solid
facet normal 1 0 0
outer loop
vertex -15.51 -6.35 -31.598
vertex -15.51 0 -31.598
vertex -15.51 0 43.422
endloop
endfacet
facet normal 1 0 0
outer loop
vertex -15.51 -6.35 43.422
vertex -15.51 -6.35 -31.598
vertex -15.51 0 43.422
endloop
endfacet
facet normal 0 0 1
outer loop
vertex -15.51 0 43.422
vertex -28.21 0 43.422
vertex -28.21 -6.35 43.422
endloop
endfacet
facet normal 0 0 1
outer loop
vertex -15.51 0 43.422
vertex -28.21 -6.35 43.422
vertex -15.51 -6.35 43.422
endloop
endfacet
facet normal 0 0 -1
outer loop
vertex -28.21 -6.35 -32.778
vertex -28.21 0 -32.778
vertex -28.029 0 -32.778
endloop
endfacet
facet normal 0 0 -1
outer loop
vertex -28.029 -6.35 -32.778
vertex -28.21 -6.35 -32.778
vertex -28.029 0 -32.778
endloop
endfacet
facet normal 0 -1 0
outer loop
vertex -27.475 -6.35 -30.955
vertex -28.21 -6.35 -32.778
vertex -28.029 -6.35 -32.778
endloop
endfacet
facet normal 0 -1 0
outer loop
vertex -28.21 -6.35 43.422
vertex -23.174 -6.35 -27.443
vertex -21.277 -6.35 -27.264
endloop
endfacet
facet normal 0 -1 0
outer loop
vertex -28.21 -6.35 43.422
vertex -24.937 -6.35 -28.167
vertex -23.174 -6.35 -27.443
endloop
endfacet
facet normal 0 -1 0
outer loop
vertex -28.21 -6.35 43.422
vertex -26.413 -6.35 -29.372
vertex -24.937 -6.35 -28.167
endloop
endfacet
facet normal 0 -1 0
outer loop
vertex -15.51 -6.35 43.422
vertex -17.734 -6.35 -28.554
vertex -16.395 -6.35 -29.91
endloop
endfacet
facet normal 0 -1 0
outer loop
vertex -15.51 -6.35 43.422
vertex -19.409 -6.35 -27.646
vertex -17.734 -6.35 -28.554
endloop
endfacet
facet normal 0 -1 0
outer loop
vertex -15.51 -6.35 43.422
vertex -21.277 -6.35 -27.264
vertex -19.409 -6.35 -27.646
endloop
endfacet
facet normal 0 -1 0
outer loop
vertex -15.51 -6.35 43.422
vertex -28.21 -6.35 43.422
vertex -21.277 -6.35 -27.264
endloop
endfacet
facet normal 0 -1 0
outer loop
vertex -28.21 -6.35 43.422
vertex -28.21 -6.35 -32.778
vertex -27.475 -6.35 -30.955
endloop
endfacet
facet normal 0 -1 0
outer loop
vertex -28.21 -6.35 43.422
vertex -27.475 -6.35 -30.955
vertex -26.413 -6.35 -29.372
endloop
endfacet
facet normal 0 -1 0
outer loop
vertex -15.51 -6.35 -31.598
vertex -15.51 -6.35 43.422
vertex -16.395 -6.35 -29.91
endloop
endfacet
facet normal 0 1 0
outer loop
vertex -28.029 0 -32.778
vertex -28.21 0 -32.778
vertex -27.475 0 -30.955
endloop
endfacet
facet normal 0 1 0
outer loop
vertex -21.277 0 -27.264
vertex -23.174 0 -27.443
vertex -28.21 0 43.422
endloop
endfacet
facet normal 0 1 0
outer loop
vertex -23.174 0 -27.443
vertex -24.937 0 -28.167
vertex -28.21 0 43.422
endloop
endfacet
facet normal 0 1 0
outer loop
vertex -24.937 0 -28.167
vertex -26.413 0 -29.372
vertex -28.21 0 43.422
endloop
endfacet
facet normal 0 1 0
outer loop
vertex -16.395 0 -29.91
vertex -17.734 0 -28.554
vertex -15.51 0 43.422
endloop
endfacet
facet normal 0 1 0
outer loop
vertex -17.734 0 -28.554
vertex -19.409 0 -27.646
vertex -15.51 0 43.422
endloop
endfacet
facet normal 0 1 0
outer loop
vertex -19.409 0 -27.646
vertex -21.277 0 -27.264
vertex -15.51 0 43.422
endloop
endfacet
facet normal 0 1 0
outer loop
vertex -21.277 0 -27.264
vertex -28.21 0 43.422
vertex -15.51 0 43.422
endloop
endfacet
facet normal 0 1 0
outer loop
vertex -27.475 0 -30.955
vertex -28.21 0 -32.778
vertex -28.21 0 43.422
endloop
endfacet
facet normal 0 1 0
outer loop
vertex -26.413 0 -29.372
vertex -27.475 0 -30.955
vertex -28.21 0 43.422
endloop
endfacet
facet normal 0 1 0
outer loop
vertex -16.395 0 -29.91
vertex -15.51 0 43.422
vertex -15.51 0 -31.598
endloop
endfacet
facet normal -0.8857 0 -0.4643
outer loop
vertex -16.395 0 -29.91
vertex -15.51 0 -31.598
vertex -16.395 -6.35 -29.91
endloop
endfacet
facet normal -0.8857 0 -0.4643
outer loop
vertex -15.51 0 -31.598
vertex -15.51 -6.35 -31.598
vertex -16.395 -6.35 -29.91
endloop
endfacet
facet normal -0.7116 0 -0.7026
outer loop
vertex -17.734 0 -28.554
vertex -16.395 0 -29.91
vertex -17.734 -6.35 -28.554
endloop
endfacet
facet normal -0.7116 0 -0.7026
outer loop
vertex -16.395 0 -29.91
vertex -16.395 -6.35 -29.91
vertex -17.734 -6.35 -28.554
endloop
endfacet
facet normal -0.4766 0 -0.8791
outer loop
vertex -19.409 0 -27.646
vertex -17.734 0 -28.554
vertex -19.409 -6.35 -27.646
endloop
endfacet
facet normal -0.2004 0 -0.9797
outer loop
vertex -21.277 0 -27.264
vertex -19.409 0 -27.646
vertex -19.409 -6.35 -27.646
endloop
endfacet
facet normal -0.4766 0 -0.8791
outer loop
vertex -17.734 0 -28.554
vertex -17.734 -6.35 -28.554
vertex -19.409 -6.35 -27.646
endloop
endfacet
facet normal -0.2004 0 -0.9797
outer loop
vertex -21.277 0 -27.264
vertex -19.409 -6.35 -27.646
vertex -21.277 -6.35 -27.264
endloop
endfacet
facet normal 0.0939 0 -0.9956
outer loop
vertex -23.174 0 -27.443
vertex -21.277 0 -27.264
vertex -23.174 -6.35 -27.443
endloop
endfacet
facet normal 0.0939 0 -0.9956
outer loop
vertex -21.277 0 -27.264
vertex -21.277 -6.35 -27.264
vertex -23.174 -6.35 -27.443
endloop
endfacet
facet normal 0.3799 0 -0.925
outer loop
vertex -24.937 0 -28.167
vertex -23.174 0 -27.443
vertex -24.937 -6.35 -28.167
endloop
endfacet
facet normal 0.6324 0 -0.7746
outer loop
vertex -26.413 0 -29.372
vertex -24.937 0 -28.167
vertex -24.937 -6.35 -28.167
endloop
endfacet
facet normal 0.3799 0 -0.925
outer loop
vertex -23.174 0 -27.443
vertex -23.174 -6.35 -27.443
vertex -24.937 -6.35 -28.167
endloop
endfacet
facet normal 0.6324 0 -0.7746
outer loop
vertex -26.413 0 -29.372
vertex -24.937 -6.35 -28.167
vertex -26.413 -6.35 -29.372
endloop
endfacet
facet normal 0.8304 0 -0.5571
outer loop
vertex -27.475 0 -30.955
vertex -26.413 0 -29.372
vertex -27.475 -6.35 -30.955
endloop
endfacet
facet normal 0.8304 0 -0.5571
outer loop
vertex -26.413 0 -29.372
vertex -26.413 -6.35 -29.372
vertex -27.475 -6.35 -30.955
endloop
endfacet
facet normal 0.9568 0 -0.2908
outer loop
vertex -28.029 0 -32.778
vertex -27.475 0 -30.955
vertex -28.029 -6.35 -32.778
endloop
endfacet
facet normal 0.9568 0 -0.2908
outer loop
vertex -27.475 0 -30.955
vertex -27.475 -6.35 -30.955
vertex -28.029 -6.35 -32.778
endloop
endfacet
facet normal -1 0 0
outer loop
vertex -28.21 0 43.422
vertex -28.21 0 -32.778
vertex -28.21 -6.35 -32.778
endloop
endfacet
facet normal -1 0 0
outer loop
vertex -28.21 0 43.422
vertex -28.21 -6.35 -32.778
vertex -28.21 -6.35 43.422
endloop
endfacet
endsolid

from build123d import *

# Parameters (mm, degrees)
F0_W     = 12.7
F0_H     = 76.2
F1_DEPTH = 6.35
F2_R     = 6.475828
F3_DEPTH = 12.7


with BuildPart() as f1:
    # F0 (on Front) → F1 (new body)
    with BuildSketch(Plane.XZ):
        with Locations((-21.859534, 5.321618)):
            Rectangle(F0_W, F0_H)
    extrude(amount=F1_DEPTH)

    # F2 (on Front) → F3 (cut, symmetric)
    with BuildSketch(Plane.XZ):
        with Locations((-21.623934, -33.730884)):
            Circle(F2_R)
    extrude(amount=F3_DEPTH, both=True, mode=Mode.SUBTRACT)


solid = f1.part
